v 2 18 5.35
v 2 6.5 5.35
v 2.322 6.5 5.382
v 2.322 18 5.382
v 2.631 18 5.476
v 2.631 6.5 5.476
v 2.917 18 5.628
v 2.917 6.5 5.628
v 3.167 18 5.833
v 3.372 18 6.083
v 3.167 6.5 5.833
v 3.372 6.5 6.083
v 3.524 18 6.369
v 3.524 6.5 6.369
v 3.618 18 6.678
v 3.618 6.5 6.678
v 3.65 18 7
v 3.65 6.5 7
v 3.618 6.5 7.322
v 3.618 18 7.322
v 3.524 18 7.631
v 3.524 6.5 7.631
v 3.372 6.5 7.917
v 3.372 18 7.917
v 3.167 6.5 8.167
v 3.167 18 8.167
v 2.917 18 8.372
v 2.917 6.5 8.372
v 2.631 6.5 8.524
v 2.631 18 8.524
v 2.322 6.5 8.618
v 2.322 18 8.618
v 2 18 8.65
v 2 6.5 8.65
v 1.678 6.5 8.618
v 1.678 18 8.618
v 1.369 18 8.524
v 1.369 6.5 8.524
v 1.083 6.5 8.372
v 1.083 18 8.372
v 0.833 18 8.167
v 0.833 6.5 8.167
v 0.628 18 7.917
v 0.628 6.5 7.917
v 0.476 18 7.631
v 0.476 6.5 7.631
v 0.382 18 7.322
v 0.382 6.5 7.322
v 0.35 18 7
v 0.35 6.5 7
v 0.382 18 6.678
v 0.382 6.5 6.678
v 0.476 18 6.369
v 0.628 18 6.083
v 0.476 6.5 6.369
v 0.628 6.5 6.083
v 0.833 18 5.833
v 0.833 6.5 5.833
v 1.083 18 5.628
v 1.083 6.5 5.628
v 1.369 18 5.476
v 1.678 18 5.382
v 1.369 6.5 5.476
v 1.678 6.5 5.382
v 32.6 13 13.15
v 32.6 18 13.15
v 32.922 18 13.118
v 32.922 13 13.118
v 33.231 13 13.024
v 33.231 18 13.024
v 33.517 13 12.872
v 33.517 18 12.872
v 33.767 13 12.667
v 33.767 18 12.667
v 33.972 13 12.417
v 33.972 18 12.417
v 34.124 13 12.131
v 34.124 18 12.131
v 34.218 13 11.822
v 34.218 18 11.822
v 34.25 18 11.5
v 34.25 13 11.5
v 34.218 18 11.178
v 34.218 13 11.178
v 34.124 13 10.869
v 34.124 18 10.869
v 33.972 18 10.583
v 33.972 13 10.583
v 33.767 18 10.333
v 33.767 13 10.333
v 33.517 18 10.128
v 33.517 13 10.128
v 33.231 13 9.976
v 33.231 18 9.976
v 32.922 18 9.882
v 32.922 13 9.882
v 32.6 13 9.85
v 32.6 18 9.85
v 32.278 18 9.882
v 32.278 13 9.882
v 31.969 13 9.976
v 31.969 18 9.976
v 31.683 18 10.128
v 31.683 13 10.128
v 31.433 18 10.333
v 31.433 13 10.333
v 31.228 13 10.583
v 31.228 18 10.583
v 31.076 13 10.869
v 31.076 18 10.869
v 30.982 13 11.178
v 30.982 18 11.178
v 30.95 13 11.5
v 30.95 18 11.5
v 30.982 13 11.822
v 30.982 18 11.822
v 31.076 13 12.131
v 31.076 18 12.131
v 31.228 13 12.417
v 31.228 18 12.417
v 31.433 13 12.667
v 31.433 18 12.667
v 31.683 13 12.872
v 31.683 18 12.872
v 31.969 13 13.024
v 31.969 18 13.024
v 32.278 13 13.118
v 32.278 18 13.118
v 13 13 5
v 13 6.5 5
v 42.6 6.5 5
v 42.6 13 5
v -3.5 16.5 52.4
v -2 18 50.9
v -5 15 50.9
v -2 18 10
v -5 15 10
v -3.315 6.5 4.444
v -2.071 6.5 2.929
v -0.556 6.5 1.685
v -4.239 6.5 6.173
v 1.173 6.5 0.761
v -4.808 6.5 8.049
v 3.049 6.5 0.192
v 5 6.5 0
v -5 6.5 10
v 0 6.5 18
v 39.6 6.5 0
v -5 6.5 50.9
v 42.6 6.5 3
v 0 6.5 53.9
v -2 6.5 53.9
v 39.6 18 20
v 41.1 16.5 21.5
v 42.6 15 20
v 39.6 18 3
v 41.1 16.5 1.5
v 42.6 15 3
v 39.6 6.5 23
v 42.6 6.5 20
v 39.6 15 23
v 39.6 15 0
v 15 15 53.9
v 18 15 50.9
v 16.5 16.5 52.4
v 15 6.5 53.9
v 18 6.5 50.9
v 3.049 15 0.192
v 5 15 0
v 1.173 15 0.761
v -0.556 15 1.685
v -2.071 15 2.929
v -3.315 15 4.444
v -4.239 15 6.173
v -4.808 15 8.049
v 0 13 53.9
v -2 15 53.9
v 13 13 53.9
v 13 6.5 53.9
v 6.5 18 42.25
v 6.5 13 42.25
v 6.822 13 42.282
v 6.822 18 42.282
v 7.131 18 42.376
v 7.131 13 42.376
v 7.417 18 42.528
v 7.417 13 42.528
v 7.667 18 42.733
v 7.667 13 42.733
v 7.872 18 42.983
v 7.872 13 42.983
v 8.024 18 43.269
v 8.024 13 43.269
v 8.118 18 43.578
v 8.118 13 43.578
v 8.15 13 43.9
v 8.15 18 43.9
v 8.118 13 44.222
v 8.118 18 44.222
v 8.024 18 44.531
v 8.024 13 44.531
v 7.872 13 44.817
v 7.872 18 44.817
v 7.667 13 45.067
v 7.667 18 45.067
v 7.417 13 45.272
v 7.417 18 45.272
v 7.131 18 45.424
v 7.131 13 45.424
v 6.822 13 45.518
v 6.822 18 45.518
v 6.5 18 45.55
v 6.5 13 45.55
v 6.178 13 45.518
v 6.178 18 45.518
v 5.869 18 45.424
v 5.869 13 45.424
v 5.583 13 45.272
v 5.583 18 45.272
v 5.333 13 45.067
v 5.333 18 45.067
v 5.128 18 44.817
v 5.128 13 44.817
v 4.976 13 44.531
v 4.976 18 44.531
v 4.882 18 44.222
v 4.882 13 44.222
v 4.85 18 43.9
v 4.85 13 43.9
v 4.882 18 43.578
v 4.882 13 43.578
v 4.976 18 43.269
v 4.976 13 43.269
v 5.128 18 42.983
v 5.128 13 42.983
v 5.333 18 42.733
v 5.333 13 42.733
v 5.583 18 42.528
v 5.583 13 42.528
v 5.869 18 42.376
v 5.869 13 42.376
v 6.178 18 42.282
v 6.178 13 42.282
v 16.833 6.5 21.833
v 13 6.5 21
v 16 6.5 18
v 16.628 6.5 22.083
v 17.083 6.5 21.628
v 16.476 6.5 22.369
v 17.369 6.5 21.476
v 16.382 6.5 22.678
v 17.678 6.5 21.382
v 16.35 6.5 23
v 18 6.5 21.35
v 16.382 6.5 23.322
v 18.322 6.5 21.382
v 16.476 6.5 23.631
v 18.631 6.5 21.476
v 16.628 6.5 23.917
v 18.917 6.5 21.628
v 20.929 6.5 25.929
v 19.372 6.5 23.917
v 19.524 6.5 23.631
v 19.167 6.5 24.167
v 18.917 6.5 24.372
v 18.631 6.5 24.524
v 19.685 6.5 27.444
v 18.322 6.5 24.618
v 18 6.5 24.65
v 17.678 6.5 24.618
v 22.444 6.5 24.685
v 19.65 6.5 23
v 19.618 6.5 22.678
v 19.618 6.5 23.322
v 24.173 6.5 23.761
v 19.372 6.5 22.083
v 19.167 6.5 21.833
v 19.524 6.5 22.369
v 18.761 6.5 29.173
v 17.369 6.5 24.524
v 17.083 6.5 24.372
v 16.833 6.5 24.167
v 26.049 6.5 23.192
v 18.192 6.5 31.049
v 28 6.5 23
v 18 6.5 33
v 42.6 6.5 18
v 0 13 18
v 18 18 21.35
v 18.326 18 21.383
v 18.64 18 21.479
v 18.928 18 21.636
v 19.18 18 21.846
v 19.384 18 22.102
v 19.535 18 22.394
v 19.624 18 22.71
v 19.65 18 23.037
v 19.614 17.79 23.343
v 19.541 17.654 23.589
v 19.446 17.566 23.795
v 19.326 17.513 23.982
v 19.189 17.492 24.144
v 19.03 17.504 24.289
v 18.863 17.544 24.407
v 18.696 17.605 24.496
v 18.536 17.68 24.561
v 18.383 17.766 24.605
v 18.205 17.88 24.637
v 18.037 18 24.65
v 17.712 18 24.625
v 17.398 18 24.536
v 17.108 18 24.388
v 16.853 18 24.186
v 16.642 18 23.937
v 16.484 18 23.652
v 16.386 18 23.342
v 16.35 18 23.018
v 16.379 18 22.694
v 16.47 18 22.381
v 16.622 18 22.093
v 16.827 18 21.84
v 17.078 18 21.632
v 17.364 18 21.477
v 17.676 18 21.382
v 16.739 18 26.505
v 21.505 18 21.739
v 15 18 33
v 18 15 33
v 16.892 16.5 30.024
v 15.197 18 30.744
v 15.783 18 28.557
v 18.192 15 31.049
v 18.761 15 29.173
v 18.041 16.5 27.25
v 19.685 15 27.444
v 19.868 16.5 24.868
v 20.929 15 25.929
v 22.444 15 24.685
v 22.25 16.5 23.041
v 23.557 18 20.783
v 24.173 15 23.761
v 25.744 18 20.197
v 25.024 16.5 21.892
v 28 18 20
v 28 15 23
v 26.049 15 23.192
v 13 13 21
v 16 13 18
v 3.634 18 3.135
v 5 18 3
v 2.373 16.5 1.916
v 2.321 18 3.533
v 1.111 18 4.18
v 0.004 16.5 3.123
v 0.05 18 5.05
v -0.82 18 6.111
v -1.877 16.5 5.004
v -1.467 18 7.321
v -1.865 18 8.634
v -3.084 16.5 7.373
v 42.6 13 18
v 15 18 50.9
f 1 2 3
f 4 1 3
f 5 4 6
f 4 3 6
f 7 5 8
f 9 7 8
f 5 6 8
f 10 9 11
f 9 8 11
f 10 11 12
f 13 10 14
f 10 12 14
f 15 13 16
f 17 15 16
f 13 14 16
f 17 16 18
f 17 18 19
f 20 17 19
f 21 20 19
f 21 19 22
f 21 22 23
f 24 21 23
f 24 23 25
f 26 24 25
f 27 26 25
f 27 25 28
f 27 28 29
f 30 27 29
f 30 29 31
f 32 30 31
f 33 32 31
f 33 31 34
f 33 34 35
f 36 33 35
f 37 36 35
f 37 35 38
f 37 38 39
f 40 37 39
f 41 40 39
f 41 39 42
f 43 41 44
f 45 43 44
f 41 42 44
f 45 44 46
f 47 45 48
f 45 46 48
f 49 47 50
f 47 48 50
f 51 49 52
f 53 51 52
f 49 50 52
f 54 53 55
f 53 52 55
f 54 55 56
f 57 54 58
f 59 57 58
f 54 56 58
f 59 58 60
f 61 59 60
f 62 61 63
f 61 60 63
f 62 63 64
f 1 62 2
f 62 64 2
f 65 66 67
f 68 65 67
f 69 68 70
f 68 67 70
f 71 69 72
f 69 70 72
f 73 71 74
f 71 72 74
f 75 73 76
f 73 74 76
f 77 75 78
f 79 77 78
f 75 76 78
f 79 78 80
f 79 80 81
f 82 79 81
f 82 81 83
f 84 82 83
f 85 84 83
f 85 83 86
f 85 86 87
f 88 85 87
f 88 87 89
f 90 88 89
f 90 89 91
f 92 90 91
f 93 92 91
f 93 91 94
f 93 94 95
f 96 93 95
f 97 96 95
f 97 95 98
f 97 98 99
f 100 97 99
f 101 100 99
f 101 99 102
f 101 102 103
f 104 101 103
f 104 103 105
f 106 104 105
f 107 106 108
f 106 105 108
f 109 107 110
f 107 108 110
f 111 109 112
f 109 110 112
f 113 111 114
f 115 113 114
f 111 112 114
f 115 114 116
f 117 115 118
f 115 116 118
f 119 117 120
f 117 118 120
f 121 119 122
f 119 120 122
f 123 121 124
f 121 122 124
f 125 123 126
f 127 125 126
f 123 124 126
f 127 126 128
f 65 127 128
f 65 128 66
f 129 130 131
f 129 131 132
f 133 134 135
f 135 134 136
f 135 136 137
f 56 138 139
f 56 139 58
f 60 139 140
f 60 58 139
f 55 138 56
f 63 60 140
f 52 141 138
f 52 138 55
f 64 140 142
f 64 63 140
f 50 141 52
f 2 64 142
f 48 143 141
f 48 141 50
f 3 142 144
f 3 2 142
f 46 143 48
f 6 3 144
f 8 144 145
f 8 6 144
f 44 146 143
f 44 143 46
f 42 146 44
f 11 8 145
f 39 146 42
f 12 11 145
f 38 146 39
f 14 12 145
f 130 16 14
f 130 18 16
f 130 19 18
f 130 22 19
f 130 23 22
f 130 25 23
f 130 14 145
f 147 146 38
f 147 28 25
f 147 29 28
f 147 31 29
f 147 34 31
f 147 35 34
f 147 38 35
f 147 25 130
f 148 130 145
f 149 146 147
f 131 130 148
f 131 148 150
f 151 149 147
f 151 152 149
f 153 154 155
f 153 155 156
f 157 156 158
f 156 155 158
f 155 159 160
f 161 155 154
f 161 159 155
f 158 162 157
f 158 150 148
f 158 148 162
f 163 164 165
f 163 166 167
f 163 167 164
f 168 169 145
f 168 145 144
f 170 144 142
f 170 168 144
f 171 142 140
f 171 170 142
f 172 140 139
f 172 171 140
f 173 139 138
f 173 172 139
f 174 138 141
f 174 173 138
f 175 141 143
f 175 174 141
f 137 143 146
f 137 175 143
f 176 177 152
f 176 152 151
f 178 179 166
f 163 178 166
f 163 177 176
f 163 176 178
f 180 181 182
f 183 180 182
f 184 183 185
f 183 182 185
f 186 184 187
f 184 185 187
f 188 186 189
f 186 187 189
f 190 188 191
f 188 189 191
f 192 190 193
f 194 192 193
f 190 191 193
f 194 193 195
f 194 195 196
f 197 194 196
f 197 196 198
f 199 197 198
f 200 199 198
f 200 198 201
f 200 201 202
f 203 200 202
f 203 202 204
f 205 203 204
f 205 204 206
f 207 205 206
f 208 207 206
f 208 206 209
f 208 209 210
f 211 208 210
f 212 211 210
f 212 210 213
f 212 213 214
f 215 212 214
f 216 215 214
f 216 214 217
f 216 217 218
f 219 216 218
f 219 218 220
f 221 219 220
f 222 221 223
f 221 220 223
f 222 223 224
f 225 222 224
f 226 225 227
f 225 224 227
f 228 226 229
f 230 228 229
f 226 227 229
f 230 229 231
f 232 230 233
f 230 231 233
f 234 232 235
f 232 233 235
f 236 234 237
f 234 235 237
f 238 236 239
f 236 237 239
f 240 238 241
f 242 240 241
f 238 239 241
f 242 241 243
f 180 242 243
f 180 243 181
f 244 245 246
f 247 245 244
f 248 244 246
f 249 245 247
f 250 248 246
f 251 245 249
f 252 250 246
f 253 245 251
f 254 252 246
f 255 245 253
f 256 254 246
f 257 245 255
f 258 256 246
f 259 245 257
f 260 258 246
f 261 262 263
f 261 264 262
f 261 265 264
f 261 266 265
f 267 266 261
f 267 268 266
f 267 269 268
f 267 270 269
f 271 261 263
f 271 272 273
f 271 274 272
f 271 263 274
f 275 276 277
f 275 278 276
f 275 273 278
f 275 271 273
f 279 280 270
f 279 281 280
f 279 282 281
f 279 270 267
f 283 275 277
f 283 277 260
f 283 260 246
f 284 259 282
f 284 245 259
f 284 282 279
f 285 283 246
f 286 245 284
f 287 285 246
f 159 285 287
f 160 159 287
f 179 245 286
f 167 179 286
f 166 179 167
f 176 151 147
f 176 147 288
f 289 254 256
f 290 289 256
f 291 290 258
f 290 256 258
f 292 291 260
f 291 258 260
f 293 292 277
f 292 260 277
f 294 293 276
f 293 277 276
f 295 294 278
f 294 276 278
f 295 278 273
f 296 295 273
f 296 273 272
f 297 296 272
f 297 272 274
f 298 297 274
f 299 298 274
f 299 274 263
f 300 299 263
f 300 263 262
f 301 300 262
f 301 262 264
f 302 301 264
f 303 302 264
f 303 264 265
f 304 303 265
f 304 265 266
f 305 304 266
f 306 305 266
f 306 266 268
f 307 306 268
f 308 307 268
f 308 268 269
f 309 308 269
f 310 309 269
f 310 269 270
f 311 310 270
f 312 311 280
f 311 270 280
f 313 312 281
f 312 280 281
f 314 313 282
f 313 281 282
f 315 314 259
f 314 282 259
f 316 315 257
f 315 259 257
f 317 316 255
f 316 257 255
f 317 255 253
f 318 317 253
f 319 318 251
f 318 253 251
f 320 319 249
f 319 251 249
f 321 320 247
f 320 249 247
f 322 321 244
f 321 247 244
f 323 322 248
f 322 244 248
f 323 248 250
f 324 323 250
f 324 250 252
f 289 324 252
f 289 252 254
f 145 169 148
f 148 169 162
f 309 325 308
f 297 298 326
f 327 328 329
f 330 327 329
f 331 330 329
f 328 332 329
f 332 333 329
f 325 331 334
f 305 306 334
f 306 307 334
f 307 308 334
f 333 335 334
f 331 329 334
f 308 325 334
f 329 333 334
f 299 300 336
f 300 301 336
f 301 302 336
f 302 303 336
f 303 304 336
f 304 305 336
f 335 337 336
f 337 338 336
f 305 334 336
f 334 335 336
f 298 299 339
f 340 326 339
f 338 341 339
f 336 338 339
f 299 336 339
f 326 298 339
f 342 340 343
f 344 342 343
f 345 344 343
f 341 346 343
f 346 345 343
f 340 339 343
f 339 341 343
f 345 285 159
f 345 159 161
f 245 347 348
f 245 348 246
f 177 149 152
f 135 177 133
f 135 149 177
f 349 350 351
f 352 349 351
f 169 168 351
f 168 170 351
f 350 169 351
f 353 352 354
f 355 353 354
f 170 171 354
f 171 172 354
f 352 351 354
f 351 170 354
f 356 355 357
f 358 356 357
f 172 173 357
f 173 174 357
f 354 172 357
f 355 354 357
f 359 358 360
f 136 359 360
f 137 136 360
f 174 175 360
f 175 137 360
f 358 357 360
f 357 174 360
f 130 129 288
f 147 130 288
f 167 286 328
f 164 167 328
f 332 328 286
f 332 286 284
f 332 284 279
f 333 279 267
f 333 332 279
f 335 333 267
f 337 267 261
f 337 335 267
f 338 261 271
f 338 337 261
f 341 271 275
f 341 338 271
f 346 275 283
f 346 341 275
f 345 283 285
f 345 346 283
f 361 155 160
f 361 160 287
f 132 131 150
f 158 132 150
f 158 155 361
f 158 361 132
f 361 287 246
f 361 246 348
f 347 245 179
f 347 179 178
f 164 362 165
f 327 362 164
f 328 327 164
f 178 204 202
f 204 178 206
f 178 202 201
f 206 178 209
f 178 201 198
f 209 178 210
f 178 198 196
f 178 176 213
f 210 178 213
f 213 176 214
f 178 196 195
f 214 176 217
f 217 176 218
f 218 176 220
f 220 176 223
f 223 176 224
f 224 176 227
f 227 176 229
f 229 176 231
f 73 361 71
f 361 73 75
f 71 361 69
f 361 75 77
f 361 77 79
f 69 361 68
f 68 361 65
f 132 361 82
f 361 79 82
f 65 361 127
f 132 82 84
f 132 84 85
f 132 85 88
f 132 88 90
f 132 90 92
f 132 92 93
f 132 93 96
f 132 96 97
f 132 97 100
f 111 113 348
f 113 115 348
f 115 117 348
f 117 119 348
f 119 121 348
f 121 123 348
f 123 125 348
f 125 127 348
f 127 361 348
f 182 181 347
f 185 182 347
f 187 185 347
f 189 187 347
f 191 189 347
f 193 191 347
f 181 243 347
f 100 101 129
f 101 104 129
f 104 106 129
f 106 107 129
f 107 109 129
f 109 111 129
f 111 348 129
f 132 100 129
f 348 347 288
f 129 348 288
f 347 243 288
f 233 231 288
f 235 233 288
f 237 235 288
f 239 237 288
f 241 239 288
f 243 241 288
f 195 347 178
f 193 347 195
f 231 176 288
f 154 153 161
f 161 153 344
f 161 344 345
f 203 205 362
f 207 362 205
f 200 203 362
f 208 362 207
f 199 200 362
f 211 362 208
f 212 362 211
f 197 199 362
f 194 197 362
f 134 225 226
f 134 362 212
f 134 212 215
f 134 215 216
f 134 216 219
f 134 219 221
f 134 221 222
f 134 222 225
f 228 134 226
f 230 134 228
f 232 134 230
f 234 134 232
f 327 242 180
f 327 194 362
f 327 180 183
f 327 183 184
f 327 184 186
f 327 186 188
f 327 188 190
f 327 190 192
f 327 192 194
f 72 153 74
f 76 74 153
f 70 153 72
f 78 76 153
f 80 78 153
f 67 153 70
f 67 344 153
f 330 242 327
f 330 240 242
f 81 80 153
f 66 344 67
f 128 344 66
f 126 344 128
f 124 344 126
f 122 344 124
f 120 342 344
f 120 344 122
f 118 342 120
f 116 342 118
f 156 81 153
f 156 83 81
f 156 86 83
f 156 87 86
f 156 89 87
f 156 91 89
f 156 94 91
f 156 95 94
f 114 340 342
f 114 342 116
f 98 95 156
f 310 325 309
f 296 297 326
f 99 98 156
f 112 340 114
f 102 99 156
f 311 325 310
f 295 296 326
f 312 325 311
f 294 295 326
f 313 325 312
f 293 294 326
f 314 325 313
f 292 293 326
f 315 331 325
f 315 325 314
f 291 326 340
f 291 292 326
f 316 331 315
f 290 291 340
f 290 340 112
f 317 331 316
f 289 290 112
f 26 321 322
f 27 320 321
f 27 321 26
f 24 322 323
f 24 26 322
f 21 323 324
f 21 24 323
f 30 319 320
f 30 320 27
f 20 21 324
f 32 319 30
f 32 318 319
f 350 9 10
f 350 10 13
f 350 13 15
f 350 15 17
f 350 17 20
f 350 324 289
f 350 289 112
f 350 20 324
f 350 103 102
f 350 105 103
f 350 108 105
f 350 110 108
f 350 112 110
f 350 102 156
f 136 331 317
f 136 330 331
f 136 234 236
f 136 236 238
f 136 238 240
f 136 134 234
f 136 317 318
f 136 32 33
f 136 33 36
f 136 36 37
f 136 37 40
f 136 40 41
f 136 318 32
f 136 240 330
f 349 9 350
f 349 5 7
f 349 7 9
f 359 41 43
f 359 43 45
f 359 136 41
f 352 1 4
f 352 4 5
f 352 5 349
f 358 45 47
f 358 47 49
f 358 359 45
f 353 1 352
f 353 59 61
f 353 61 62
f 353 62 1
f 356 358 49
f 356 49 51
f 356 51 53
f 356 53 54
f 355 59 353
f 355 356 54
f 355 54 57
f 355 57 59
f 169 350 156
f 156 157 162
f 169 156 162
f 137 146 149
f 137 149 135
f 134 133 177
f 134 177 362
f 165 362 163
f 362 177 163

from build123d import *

# Parameters (mm, degrees)
SKETCH_1_W          = 23
SKETCH_1_H          = 23
SKETCH_1_W_2        = 13
SKETCH_1_H_2        = 13
EXTRUDE_1_DEPTH     = 53.9
SKETCH_2_R          = 1.65
CUT_EXTRUDE_1_DEPTH = 34
SKETCH_4_W          = 23
SKETCH_4_H          = 23
SKETCH_4_R          = 3
EXTRUDE_2_DEPTH     = 14.6
SKETCH_5_W          = 23
SKETCH_5_H          = 23
SKETCH_5_W_2        = 13
SKETCH_5_H_2        = 13
EXTRUDE_1_2_DEPTH   = 10
SKETCH_6_R          = 1.65
CUT_EXTRUDE_2_DEPTH = 39
SKETCH_7_W          = 13
SKETCH_7_H          = 13
CUT_EXTRUDE_3_DEPTH = 24.6
CHAMFER_1_SIZE      = 3
SKETCH_8_W          = 47.6
SKETCH_8_H          = 53.9
CUT_EXTRUDE_4_DEPTH = 11.5
EXTRUDE_3_DEPTH     = 6.5
FILLET_1_R          = 10
FILLET_2_R          = 10
SKETCH_10_R         = 1.65
CUT_EXTRUDE_5_DEPTH = 28.5
CHAMFER_3_SIZE      = 3
CHAMFER_4_SIZE      = 3
CHAMFER_5_SIZE      = 3


with BuildPart() as part:
    # 草图1 → Extrude 1 (new body)
    with BuildSketch(Plane.XY):
        with Locations((6.5, 6.5)):
            Rectangle(SKETCH_1_W, SKETCH_1_H)
        with Locations((6.5, 6.5)):
            Rectangle(SKETCH_1_W_2, SKETCH_1_H_2, mode=Mode.SUBTRACT)
    extrude(amount=EXTRUDE_1_DEPTH)

    # 草图2 → 切除-拉伸1 (cut)
    with BuildSketch(Plane.XZ.offset(5)):
        with Locations(Location((6.5, 43.9, 0), (0, 0, 270))):
            Circle(SKETCH_2_R)
    extrude(amount=-CUT_EXTRUDE_1_DEPTH, mode=Mode.SUBTRACT)

    # 草图4 → 凸台-拉伸2 (add)
    with BuildSketch(Plane(origin=(18, 0, 0), x_dir=(0, 0, -1), z_dir=(1, 0, 0))):
        with Locations((-11.5, 6.5)):
            Rectangle(SKETCH_4_W, SKETCH_4_H)
        with Locations(Location((-11.5, 6.5, 0), (0, 0, 90))):
            Circle(SKETCH_4_R, mode=Mode.SUBTRACT)
    extrude(amount=EXTRUDE_2_DEPTH)

    # 草图5 → Extrude 1 2 (add)
    with BuildSketch(Plane(origin=(32.6, 0, 0), x_dir=(0, 0, -1), z_dir=(1, 0, 0))):
        with Locations((-11.5, 6.5)):
            Rectangle(SKETCH_5_W, SKETCH_5_H)
        with Locations((-11.5, 6.5)):
            Rectangle(SKETCH_5_W_2, SKETCH_5_H_2, mode=Mode.SUBTRACT)
    extrude(amount=EXTRUDE_1_2_DEPTH)

    # 草图6 → 切除-拉伸2 (cut)
    with BuildSketch(Plane(origin=(0, 18, 0), x_dir=(1, 0, 0), z_dir=(0, 1, 0))):
        with Locations(Location((32.6, -11.5, 0), (0, 0, 270))):
            Circle(SKETCH_6_R)
    extrude(amount=-CUT_EXTRUDE_2_DEPTH, mode=Mode.SUBTRACT)

    # 草图7 → 切除-拉伸3 (cut)
    with BuildSketch(Plane(origin=(32.6, 0, 0), x_dir=(0, 0, -1), z_dir=(1, 0, 0))):
        with Locations((-11.5, 6.5)):
            Rectangle(SKETCH_7_W, SKETCH_7_H)
    extrude(amount=-CUT_EXTRUDE_3_DEPTH, mode=Mode.SUBTRACT)

    # 倒角1
    chamfer_1_edges = [part.edges().sort_by_distance(p)[0] for p in [
        (13, 6.5, 18),
    ]]
    chamfer(chamfer_1_edges, length=CHAMFER_1_SIZE)

    # 草图8 → 切除-拉伸4 (cut)
    with BuildSketch(Plane.XZ.offset(5)):
        with Locations((18.8, 26.95)):
            Rectangle(SKETCH_8_W, SKETCH_8_H)
    extrude(amount=-CUT_EXTRUDE_4_DEPTH, mode=Mode.SUBTRACT)

    # 草图9 → 凸台-拉伸3 (add)
    with BuildSketch(Plane.XZ.offset(-13)):
        Polygon((13, 5), (0, 18), (0, 0), (13, 0), align=None)
    extrude(amount=EXTRUDE_3_DEPTH)

    # 圆角1
    fillet_1_edges = [part.edges().sort_by_distance(p)[0] for p in [
        (-5, 12.25, 0),
    ]]
    fillet(fillet_1_edges, radius=FILLET_1_R)

    # 圆角2
    fillet_2_edges = [part.edges().sort_by_distance(p)[0] for p in [
        (18, 12.25, 23),
    ]]
    fillet(fillet_2_edges, radius=FILLET_2_R)

    # 草图10 → 切除-拉伸5 (cut)
    with BuildSketch(Plane.XZ.offset(-6.5)):
        with Locations(Location((2, 7, 0), (0, 0, 270))):
            Circle(SKETCH_10_R)
        with Locations(Location((18, 23, 0), (0, 0, 270))):
            Circle(SKETCH_10_R)
    extrude(amount=-CUT_EXTRUDE_5_DEPTH, mode=Mode.SUBTRACT)

    # 倒角3
    # the kernel refuses this chamfer: 3 mm, written as the material it takes off along each edge
    with BuildSketch(Plane(origin=(5, 18, 10), x_dir=(0, 0, -1), z_dir=(1, 0, 0))) as chamfer_3_piece_1:
        Polygon((10 - CHAMFER_3_SIZE, 0), (10, -CHAMFER_3_SIZE), (10, 0), align=None)
    revolve(axis=Axis((5, 18, 10), (0, 1, 0)), revolution_arc=90, mode=Mode.SUBTRACT)
    with BuildSketch(Plane(origin=(28, 18, 33), x_dir=(-1, 0, 0), z_dir=(0, 0, 1))) as chamfer_3_piece_2:
        Polygon((10 + CHAMFER_3_SIZE, 0), (10, CHAMFER_3_SIZE), (10, 0), align=None)
    revolve(axis=Axis((28, 18, 33), (0, -1, 0)), revolution_arc=90, mode=Mode.SUBTRACT)
    with BuildSketch(Plane(origin=(28, 18, 23), x_dir=(0, 0.027495876610586768, -0.9996219169112968), z_dir=(1, 0, 0))) as chamfer_3_piece_3:
        Polygon((CHAMFER_3_SIZE * 0.999621916911, -CHAMFER_3_SIZE * 0.0274958766106), (-CHAMFER_3_SIZE * 0.0274958766106, -CHAMFER_3_SIZE * 0.999621916911), (0, 0), align=None)
    extrude(amount=22.315048964, mode=Mode.SUBTRACT)
    with BuildSketch(Plane(origin=(50.315048964, 18, 0), x_dir=(0, 0.027495876610586778, 0.9996219169112968), z_dir=(-1, 0, 0))) as chamfer_3_piece_4:
        Polygon((CHAMFER_3_SIZE * 0.999621916911, -CHAMFER_3_SIZE * 0.0274958766106), (-CHAMFER_3_SIZE * 0.0274958766106, -CHAMFER_3_SIZE * 0.999621916911), (0, 0), align=None)
    extrude(amount=45.315048964, mode=Mode.SUBTRACT)
    with BuildSketch(Plane(origin=(-5, 18, 10), x_dir=(0.9996219169112968, 0.027495876610586778, 0), z_dir=(0, 0, 1))) as chamfer_3_piece_5:
        Polygon((CHAMFER_3_SIZE * 0.999621916911, -CHAMFER_3_SIZE * 0.0274958766106), (-CHAMFER_3_SIZE * 0.0274958766106, -CHAMFER_3_SIZE * 0.999621916911), (0, 0), align=None)
    extrude(amount=51.615048964, mode=Mode.SUBTRACT)
    with BuildSketch(Plane(origin=(18, 18, 33), x_dir=(-0.9996219169112968, 0.02749587661058678, 0), z_dir=(0, 0, 1))) as chamfer_3_piece_6:
        Polygon((CHAMFER_3_SIZE * 0.999621916911, CHAMFER_3_SIZE * 0.0274958766106), (-CHAMFER_3_SIZE * 0.0274958766106, CHAMFER_3_SIZE * 0.999621916911), (0, 0), align=None)
    extrude(amount=28.615048964, mode=Mode.SUBTRACT)

    # 倒角4
    chamfer_4_edges = [part.edges().sort_by_distance(p)[0] for p in [
        (42.6, 18, 11.5),
        (6.5, 18, 53.9),
    ]]
    chamfer(chamfer_4_edges, length=CHAMFER_4_SIZE)

    # 倒角5
    chamfer_5_edges = [part.edges().sort_by_distance(p)[0] for p in [
        (42.6, 10.75, 0),
        (18, 10.75, 53.9),
        (-5, 10.75, 53.9),
        (42.6, 10.75, 23),
    ]]
    chamfer(chamfer_5_edges, length=CHAMFER_5_SIZE)


solid = part.part
